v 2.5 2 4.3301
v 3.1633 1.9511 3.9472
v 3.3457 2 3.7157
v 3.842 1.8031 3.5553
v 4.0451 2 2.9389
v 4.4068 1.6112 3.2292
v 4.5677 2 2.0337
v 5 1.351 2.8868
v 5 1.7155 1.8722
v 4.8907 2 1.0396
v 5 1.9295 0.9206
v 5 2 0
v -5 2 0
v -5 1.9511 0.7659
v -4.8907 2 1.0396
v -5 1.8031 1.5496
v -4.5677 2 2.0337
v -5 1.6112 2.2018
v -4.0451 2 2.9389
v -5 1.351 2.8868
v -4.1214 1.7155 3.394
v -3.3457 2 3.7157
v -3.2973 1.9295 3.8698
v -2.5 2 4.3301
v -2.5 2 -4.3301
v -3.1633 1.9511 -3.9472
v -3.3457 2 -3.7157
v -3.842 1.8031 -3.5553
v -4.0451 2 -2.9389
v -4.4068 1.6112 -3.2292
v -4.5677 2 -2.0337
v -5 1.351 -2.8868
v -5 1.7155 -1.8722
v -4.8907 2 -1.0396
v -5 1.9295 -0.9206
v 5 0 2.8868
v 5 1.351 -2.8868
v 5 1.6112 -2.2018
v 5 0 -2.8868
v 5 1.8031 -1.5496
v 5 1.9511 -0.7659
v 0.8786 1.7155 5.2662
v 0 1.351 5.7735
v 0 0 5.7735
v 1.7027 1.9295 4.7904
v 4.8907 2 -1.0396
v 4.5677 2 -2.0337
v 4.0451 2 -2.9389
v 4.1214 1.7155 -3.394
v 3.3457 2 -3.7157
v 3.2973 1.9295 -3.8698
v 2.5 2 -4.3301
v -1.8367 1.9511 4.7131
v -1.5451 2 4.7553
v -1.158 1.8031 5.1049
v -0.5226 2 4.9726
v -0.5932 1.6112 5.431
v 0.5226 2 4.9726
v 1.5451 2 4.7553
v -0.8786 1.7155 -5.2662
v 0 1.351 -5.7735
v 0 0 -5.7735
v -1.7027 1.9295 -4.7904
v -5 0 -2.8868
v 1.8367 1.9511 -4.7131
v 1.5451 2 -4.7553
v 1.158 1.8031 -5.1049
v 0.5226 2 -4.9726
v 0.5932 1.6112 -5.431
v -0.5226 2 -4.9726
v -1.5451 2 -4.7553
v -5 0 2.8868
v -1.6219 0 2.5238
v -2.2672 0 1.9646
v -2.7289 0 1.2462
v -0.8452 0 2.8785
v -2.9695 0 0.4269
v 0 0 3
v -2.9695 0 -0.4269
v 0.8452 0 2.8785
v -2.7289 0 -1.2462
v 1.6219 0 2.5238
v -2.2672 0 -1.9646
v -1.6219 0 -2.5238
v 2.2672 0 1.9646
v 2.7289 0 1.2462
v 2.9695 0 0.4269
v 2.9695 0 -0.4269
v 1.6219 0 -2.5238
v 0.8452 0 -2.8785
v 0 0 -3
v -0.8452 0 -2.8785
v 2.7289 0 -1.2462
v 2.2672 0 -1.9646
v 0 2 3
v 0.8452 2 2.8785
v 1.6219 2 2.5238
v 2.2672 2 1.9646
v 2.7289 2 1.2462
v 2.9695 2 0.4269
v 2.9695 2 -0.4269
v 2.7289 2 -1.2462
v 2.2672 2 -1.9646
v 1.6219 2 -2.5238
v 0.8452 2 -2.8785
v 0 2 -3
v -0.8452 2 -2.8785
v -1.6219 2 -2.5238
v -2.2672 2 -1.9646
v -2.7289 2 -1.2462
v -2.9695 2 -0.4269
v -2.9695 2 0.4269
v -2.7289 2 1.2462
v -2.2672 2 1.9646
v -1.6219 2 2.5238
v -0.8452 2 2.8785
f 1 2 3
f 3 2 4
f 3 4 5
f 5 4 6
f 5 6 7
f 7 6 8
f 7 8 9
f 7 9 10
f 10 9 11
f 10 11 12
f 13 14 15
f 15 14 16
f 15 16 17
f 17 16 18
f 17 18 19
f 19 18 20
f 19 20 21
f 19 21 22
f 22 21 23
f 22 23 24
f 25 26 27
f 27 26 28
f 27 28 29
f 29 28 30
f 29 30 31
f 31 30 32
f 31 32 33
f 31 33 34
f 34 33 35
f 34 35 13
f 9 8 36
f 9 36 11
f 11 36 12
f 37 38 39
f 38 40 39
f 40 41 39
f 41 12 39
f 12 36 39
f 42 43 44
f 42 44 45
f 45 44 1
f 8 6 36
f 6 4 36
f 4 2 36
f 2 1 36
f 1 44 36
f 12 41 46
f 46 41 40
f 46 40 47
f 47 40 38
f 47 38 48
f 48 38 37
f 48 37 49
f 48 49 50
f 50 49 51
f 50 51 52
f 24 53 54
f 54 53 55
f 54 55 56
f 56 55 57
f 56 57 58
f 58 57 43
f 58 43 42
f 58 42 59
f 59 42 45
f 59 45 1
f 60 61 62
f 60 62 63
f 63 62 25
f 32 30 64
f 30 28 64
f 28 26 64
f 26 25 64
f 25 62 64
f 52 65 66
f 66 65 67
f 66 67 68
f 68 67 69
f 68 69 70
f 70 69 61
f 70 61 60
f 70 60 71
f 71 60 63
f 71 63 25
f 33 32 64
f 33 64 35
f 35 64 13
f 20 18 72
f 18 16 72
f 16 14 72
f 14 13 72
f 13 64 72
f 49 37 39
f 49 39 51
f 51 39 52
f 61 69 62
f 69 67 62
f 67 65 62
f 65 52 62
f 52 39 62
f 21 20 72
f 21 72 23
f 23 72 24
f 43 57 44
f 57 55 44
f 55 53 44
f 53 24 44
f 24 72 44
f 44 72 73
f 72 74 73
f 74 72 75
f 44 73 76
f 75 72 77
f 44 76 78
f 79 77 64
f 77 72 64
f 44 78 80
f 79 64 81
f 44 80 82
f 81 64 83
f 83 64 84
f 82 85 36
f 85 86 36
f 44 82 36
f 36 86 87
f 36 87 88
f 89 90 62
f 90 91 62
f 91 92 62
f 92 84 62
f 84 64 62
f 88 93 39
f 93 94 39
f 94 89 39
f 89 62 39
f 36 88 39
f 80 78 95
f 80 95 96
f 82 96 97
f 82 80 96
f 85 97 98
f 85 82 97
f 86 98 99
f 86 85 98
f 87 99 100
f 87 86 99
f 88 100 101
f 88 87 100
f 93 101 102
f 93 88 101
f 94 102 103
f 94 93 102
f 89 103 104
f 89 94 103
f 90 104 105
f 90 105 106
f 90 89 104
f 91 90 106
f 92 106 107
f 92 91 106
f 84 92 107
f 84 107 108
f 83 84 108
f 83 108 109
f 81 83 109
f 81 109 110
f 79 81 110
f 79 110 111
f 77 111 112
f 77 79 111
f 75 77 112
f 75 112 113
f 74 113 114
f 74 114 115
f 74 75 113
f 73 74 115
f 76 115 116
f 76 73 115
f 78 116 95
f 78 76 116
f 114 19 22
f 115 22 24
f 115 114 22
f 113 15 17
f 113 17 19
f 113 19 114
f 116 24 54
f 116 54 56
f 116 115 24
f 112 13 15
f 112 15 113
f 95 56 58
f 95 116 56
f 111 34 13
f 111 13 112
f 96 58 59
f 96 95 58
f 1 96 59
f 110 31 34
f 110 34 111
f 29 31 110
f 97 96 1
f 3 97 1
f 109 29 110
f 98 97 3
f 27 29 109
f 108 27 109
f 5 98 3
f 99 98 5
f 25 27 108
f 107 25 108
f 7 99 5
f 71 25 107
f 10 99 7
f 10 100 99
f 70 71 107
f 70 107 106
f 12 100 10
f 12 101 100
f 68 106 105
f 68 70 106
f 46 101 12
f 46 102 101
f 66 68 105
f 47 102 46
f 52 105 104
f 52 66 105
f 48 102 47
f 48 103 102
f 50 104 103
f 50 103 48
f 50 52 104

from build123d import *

# Parameters (mm, degrees)
SKETCH1_R           = 3
BOSS_EXTRUDE1_DEPTH = 2


# Read off the part's stored shape, not the designer's step: Cut-Extrude2
with BuildPart() as part:
    # Sketch1 → Boss-Extrude1 (new body)
    with BuildSketch(Plane(origin=(0, 0, 0), x_dir=(1, 0, 0), z_dir=(0, 1, 0))):
        Polygon((0, -5.773502692), (5, -2.886751346), (5, 2.886751346), (0, 5.773502692), (-5, 2.886751346), (-5, -2.886751346), align=None)
        with Locations(Location((0, 0, 0), (0, 0, 270))):
            Circle(SKETCH1_R, mode=Mode.SUBTRACT)
    extrude(amount=BOSS_EXTRUDE1_DEPTH)

    # Cut-Extrude2 outline → Cut-Extrude2 (revolve, cut)
    with BuildSketch(Plane.XY):
        Polygon((5.773502708, 2), (5, 2), (5.773502708, 1.350954163), align=None)
    revolve(axis=Axis((0, 0, 0), (0, 1, 0)), mode=Mode.SUBTRACT)


solid = part.part
